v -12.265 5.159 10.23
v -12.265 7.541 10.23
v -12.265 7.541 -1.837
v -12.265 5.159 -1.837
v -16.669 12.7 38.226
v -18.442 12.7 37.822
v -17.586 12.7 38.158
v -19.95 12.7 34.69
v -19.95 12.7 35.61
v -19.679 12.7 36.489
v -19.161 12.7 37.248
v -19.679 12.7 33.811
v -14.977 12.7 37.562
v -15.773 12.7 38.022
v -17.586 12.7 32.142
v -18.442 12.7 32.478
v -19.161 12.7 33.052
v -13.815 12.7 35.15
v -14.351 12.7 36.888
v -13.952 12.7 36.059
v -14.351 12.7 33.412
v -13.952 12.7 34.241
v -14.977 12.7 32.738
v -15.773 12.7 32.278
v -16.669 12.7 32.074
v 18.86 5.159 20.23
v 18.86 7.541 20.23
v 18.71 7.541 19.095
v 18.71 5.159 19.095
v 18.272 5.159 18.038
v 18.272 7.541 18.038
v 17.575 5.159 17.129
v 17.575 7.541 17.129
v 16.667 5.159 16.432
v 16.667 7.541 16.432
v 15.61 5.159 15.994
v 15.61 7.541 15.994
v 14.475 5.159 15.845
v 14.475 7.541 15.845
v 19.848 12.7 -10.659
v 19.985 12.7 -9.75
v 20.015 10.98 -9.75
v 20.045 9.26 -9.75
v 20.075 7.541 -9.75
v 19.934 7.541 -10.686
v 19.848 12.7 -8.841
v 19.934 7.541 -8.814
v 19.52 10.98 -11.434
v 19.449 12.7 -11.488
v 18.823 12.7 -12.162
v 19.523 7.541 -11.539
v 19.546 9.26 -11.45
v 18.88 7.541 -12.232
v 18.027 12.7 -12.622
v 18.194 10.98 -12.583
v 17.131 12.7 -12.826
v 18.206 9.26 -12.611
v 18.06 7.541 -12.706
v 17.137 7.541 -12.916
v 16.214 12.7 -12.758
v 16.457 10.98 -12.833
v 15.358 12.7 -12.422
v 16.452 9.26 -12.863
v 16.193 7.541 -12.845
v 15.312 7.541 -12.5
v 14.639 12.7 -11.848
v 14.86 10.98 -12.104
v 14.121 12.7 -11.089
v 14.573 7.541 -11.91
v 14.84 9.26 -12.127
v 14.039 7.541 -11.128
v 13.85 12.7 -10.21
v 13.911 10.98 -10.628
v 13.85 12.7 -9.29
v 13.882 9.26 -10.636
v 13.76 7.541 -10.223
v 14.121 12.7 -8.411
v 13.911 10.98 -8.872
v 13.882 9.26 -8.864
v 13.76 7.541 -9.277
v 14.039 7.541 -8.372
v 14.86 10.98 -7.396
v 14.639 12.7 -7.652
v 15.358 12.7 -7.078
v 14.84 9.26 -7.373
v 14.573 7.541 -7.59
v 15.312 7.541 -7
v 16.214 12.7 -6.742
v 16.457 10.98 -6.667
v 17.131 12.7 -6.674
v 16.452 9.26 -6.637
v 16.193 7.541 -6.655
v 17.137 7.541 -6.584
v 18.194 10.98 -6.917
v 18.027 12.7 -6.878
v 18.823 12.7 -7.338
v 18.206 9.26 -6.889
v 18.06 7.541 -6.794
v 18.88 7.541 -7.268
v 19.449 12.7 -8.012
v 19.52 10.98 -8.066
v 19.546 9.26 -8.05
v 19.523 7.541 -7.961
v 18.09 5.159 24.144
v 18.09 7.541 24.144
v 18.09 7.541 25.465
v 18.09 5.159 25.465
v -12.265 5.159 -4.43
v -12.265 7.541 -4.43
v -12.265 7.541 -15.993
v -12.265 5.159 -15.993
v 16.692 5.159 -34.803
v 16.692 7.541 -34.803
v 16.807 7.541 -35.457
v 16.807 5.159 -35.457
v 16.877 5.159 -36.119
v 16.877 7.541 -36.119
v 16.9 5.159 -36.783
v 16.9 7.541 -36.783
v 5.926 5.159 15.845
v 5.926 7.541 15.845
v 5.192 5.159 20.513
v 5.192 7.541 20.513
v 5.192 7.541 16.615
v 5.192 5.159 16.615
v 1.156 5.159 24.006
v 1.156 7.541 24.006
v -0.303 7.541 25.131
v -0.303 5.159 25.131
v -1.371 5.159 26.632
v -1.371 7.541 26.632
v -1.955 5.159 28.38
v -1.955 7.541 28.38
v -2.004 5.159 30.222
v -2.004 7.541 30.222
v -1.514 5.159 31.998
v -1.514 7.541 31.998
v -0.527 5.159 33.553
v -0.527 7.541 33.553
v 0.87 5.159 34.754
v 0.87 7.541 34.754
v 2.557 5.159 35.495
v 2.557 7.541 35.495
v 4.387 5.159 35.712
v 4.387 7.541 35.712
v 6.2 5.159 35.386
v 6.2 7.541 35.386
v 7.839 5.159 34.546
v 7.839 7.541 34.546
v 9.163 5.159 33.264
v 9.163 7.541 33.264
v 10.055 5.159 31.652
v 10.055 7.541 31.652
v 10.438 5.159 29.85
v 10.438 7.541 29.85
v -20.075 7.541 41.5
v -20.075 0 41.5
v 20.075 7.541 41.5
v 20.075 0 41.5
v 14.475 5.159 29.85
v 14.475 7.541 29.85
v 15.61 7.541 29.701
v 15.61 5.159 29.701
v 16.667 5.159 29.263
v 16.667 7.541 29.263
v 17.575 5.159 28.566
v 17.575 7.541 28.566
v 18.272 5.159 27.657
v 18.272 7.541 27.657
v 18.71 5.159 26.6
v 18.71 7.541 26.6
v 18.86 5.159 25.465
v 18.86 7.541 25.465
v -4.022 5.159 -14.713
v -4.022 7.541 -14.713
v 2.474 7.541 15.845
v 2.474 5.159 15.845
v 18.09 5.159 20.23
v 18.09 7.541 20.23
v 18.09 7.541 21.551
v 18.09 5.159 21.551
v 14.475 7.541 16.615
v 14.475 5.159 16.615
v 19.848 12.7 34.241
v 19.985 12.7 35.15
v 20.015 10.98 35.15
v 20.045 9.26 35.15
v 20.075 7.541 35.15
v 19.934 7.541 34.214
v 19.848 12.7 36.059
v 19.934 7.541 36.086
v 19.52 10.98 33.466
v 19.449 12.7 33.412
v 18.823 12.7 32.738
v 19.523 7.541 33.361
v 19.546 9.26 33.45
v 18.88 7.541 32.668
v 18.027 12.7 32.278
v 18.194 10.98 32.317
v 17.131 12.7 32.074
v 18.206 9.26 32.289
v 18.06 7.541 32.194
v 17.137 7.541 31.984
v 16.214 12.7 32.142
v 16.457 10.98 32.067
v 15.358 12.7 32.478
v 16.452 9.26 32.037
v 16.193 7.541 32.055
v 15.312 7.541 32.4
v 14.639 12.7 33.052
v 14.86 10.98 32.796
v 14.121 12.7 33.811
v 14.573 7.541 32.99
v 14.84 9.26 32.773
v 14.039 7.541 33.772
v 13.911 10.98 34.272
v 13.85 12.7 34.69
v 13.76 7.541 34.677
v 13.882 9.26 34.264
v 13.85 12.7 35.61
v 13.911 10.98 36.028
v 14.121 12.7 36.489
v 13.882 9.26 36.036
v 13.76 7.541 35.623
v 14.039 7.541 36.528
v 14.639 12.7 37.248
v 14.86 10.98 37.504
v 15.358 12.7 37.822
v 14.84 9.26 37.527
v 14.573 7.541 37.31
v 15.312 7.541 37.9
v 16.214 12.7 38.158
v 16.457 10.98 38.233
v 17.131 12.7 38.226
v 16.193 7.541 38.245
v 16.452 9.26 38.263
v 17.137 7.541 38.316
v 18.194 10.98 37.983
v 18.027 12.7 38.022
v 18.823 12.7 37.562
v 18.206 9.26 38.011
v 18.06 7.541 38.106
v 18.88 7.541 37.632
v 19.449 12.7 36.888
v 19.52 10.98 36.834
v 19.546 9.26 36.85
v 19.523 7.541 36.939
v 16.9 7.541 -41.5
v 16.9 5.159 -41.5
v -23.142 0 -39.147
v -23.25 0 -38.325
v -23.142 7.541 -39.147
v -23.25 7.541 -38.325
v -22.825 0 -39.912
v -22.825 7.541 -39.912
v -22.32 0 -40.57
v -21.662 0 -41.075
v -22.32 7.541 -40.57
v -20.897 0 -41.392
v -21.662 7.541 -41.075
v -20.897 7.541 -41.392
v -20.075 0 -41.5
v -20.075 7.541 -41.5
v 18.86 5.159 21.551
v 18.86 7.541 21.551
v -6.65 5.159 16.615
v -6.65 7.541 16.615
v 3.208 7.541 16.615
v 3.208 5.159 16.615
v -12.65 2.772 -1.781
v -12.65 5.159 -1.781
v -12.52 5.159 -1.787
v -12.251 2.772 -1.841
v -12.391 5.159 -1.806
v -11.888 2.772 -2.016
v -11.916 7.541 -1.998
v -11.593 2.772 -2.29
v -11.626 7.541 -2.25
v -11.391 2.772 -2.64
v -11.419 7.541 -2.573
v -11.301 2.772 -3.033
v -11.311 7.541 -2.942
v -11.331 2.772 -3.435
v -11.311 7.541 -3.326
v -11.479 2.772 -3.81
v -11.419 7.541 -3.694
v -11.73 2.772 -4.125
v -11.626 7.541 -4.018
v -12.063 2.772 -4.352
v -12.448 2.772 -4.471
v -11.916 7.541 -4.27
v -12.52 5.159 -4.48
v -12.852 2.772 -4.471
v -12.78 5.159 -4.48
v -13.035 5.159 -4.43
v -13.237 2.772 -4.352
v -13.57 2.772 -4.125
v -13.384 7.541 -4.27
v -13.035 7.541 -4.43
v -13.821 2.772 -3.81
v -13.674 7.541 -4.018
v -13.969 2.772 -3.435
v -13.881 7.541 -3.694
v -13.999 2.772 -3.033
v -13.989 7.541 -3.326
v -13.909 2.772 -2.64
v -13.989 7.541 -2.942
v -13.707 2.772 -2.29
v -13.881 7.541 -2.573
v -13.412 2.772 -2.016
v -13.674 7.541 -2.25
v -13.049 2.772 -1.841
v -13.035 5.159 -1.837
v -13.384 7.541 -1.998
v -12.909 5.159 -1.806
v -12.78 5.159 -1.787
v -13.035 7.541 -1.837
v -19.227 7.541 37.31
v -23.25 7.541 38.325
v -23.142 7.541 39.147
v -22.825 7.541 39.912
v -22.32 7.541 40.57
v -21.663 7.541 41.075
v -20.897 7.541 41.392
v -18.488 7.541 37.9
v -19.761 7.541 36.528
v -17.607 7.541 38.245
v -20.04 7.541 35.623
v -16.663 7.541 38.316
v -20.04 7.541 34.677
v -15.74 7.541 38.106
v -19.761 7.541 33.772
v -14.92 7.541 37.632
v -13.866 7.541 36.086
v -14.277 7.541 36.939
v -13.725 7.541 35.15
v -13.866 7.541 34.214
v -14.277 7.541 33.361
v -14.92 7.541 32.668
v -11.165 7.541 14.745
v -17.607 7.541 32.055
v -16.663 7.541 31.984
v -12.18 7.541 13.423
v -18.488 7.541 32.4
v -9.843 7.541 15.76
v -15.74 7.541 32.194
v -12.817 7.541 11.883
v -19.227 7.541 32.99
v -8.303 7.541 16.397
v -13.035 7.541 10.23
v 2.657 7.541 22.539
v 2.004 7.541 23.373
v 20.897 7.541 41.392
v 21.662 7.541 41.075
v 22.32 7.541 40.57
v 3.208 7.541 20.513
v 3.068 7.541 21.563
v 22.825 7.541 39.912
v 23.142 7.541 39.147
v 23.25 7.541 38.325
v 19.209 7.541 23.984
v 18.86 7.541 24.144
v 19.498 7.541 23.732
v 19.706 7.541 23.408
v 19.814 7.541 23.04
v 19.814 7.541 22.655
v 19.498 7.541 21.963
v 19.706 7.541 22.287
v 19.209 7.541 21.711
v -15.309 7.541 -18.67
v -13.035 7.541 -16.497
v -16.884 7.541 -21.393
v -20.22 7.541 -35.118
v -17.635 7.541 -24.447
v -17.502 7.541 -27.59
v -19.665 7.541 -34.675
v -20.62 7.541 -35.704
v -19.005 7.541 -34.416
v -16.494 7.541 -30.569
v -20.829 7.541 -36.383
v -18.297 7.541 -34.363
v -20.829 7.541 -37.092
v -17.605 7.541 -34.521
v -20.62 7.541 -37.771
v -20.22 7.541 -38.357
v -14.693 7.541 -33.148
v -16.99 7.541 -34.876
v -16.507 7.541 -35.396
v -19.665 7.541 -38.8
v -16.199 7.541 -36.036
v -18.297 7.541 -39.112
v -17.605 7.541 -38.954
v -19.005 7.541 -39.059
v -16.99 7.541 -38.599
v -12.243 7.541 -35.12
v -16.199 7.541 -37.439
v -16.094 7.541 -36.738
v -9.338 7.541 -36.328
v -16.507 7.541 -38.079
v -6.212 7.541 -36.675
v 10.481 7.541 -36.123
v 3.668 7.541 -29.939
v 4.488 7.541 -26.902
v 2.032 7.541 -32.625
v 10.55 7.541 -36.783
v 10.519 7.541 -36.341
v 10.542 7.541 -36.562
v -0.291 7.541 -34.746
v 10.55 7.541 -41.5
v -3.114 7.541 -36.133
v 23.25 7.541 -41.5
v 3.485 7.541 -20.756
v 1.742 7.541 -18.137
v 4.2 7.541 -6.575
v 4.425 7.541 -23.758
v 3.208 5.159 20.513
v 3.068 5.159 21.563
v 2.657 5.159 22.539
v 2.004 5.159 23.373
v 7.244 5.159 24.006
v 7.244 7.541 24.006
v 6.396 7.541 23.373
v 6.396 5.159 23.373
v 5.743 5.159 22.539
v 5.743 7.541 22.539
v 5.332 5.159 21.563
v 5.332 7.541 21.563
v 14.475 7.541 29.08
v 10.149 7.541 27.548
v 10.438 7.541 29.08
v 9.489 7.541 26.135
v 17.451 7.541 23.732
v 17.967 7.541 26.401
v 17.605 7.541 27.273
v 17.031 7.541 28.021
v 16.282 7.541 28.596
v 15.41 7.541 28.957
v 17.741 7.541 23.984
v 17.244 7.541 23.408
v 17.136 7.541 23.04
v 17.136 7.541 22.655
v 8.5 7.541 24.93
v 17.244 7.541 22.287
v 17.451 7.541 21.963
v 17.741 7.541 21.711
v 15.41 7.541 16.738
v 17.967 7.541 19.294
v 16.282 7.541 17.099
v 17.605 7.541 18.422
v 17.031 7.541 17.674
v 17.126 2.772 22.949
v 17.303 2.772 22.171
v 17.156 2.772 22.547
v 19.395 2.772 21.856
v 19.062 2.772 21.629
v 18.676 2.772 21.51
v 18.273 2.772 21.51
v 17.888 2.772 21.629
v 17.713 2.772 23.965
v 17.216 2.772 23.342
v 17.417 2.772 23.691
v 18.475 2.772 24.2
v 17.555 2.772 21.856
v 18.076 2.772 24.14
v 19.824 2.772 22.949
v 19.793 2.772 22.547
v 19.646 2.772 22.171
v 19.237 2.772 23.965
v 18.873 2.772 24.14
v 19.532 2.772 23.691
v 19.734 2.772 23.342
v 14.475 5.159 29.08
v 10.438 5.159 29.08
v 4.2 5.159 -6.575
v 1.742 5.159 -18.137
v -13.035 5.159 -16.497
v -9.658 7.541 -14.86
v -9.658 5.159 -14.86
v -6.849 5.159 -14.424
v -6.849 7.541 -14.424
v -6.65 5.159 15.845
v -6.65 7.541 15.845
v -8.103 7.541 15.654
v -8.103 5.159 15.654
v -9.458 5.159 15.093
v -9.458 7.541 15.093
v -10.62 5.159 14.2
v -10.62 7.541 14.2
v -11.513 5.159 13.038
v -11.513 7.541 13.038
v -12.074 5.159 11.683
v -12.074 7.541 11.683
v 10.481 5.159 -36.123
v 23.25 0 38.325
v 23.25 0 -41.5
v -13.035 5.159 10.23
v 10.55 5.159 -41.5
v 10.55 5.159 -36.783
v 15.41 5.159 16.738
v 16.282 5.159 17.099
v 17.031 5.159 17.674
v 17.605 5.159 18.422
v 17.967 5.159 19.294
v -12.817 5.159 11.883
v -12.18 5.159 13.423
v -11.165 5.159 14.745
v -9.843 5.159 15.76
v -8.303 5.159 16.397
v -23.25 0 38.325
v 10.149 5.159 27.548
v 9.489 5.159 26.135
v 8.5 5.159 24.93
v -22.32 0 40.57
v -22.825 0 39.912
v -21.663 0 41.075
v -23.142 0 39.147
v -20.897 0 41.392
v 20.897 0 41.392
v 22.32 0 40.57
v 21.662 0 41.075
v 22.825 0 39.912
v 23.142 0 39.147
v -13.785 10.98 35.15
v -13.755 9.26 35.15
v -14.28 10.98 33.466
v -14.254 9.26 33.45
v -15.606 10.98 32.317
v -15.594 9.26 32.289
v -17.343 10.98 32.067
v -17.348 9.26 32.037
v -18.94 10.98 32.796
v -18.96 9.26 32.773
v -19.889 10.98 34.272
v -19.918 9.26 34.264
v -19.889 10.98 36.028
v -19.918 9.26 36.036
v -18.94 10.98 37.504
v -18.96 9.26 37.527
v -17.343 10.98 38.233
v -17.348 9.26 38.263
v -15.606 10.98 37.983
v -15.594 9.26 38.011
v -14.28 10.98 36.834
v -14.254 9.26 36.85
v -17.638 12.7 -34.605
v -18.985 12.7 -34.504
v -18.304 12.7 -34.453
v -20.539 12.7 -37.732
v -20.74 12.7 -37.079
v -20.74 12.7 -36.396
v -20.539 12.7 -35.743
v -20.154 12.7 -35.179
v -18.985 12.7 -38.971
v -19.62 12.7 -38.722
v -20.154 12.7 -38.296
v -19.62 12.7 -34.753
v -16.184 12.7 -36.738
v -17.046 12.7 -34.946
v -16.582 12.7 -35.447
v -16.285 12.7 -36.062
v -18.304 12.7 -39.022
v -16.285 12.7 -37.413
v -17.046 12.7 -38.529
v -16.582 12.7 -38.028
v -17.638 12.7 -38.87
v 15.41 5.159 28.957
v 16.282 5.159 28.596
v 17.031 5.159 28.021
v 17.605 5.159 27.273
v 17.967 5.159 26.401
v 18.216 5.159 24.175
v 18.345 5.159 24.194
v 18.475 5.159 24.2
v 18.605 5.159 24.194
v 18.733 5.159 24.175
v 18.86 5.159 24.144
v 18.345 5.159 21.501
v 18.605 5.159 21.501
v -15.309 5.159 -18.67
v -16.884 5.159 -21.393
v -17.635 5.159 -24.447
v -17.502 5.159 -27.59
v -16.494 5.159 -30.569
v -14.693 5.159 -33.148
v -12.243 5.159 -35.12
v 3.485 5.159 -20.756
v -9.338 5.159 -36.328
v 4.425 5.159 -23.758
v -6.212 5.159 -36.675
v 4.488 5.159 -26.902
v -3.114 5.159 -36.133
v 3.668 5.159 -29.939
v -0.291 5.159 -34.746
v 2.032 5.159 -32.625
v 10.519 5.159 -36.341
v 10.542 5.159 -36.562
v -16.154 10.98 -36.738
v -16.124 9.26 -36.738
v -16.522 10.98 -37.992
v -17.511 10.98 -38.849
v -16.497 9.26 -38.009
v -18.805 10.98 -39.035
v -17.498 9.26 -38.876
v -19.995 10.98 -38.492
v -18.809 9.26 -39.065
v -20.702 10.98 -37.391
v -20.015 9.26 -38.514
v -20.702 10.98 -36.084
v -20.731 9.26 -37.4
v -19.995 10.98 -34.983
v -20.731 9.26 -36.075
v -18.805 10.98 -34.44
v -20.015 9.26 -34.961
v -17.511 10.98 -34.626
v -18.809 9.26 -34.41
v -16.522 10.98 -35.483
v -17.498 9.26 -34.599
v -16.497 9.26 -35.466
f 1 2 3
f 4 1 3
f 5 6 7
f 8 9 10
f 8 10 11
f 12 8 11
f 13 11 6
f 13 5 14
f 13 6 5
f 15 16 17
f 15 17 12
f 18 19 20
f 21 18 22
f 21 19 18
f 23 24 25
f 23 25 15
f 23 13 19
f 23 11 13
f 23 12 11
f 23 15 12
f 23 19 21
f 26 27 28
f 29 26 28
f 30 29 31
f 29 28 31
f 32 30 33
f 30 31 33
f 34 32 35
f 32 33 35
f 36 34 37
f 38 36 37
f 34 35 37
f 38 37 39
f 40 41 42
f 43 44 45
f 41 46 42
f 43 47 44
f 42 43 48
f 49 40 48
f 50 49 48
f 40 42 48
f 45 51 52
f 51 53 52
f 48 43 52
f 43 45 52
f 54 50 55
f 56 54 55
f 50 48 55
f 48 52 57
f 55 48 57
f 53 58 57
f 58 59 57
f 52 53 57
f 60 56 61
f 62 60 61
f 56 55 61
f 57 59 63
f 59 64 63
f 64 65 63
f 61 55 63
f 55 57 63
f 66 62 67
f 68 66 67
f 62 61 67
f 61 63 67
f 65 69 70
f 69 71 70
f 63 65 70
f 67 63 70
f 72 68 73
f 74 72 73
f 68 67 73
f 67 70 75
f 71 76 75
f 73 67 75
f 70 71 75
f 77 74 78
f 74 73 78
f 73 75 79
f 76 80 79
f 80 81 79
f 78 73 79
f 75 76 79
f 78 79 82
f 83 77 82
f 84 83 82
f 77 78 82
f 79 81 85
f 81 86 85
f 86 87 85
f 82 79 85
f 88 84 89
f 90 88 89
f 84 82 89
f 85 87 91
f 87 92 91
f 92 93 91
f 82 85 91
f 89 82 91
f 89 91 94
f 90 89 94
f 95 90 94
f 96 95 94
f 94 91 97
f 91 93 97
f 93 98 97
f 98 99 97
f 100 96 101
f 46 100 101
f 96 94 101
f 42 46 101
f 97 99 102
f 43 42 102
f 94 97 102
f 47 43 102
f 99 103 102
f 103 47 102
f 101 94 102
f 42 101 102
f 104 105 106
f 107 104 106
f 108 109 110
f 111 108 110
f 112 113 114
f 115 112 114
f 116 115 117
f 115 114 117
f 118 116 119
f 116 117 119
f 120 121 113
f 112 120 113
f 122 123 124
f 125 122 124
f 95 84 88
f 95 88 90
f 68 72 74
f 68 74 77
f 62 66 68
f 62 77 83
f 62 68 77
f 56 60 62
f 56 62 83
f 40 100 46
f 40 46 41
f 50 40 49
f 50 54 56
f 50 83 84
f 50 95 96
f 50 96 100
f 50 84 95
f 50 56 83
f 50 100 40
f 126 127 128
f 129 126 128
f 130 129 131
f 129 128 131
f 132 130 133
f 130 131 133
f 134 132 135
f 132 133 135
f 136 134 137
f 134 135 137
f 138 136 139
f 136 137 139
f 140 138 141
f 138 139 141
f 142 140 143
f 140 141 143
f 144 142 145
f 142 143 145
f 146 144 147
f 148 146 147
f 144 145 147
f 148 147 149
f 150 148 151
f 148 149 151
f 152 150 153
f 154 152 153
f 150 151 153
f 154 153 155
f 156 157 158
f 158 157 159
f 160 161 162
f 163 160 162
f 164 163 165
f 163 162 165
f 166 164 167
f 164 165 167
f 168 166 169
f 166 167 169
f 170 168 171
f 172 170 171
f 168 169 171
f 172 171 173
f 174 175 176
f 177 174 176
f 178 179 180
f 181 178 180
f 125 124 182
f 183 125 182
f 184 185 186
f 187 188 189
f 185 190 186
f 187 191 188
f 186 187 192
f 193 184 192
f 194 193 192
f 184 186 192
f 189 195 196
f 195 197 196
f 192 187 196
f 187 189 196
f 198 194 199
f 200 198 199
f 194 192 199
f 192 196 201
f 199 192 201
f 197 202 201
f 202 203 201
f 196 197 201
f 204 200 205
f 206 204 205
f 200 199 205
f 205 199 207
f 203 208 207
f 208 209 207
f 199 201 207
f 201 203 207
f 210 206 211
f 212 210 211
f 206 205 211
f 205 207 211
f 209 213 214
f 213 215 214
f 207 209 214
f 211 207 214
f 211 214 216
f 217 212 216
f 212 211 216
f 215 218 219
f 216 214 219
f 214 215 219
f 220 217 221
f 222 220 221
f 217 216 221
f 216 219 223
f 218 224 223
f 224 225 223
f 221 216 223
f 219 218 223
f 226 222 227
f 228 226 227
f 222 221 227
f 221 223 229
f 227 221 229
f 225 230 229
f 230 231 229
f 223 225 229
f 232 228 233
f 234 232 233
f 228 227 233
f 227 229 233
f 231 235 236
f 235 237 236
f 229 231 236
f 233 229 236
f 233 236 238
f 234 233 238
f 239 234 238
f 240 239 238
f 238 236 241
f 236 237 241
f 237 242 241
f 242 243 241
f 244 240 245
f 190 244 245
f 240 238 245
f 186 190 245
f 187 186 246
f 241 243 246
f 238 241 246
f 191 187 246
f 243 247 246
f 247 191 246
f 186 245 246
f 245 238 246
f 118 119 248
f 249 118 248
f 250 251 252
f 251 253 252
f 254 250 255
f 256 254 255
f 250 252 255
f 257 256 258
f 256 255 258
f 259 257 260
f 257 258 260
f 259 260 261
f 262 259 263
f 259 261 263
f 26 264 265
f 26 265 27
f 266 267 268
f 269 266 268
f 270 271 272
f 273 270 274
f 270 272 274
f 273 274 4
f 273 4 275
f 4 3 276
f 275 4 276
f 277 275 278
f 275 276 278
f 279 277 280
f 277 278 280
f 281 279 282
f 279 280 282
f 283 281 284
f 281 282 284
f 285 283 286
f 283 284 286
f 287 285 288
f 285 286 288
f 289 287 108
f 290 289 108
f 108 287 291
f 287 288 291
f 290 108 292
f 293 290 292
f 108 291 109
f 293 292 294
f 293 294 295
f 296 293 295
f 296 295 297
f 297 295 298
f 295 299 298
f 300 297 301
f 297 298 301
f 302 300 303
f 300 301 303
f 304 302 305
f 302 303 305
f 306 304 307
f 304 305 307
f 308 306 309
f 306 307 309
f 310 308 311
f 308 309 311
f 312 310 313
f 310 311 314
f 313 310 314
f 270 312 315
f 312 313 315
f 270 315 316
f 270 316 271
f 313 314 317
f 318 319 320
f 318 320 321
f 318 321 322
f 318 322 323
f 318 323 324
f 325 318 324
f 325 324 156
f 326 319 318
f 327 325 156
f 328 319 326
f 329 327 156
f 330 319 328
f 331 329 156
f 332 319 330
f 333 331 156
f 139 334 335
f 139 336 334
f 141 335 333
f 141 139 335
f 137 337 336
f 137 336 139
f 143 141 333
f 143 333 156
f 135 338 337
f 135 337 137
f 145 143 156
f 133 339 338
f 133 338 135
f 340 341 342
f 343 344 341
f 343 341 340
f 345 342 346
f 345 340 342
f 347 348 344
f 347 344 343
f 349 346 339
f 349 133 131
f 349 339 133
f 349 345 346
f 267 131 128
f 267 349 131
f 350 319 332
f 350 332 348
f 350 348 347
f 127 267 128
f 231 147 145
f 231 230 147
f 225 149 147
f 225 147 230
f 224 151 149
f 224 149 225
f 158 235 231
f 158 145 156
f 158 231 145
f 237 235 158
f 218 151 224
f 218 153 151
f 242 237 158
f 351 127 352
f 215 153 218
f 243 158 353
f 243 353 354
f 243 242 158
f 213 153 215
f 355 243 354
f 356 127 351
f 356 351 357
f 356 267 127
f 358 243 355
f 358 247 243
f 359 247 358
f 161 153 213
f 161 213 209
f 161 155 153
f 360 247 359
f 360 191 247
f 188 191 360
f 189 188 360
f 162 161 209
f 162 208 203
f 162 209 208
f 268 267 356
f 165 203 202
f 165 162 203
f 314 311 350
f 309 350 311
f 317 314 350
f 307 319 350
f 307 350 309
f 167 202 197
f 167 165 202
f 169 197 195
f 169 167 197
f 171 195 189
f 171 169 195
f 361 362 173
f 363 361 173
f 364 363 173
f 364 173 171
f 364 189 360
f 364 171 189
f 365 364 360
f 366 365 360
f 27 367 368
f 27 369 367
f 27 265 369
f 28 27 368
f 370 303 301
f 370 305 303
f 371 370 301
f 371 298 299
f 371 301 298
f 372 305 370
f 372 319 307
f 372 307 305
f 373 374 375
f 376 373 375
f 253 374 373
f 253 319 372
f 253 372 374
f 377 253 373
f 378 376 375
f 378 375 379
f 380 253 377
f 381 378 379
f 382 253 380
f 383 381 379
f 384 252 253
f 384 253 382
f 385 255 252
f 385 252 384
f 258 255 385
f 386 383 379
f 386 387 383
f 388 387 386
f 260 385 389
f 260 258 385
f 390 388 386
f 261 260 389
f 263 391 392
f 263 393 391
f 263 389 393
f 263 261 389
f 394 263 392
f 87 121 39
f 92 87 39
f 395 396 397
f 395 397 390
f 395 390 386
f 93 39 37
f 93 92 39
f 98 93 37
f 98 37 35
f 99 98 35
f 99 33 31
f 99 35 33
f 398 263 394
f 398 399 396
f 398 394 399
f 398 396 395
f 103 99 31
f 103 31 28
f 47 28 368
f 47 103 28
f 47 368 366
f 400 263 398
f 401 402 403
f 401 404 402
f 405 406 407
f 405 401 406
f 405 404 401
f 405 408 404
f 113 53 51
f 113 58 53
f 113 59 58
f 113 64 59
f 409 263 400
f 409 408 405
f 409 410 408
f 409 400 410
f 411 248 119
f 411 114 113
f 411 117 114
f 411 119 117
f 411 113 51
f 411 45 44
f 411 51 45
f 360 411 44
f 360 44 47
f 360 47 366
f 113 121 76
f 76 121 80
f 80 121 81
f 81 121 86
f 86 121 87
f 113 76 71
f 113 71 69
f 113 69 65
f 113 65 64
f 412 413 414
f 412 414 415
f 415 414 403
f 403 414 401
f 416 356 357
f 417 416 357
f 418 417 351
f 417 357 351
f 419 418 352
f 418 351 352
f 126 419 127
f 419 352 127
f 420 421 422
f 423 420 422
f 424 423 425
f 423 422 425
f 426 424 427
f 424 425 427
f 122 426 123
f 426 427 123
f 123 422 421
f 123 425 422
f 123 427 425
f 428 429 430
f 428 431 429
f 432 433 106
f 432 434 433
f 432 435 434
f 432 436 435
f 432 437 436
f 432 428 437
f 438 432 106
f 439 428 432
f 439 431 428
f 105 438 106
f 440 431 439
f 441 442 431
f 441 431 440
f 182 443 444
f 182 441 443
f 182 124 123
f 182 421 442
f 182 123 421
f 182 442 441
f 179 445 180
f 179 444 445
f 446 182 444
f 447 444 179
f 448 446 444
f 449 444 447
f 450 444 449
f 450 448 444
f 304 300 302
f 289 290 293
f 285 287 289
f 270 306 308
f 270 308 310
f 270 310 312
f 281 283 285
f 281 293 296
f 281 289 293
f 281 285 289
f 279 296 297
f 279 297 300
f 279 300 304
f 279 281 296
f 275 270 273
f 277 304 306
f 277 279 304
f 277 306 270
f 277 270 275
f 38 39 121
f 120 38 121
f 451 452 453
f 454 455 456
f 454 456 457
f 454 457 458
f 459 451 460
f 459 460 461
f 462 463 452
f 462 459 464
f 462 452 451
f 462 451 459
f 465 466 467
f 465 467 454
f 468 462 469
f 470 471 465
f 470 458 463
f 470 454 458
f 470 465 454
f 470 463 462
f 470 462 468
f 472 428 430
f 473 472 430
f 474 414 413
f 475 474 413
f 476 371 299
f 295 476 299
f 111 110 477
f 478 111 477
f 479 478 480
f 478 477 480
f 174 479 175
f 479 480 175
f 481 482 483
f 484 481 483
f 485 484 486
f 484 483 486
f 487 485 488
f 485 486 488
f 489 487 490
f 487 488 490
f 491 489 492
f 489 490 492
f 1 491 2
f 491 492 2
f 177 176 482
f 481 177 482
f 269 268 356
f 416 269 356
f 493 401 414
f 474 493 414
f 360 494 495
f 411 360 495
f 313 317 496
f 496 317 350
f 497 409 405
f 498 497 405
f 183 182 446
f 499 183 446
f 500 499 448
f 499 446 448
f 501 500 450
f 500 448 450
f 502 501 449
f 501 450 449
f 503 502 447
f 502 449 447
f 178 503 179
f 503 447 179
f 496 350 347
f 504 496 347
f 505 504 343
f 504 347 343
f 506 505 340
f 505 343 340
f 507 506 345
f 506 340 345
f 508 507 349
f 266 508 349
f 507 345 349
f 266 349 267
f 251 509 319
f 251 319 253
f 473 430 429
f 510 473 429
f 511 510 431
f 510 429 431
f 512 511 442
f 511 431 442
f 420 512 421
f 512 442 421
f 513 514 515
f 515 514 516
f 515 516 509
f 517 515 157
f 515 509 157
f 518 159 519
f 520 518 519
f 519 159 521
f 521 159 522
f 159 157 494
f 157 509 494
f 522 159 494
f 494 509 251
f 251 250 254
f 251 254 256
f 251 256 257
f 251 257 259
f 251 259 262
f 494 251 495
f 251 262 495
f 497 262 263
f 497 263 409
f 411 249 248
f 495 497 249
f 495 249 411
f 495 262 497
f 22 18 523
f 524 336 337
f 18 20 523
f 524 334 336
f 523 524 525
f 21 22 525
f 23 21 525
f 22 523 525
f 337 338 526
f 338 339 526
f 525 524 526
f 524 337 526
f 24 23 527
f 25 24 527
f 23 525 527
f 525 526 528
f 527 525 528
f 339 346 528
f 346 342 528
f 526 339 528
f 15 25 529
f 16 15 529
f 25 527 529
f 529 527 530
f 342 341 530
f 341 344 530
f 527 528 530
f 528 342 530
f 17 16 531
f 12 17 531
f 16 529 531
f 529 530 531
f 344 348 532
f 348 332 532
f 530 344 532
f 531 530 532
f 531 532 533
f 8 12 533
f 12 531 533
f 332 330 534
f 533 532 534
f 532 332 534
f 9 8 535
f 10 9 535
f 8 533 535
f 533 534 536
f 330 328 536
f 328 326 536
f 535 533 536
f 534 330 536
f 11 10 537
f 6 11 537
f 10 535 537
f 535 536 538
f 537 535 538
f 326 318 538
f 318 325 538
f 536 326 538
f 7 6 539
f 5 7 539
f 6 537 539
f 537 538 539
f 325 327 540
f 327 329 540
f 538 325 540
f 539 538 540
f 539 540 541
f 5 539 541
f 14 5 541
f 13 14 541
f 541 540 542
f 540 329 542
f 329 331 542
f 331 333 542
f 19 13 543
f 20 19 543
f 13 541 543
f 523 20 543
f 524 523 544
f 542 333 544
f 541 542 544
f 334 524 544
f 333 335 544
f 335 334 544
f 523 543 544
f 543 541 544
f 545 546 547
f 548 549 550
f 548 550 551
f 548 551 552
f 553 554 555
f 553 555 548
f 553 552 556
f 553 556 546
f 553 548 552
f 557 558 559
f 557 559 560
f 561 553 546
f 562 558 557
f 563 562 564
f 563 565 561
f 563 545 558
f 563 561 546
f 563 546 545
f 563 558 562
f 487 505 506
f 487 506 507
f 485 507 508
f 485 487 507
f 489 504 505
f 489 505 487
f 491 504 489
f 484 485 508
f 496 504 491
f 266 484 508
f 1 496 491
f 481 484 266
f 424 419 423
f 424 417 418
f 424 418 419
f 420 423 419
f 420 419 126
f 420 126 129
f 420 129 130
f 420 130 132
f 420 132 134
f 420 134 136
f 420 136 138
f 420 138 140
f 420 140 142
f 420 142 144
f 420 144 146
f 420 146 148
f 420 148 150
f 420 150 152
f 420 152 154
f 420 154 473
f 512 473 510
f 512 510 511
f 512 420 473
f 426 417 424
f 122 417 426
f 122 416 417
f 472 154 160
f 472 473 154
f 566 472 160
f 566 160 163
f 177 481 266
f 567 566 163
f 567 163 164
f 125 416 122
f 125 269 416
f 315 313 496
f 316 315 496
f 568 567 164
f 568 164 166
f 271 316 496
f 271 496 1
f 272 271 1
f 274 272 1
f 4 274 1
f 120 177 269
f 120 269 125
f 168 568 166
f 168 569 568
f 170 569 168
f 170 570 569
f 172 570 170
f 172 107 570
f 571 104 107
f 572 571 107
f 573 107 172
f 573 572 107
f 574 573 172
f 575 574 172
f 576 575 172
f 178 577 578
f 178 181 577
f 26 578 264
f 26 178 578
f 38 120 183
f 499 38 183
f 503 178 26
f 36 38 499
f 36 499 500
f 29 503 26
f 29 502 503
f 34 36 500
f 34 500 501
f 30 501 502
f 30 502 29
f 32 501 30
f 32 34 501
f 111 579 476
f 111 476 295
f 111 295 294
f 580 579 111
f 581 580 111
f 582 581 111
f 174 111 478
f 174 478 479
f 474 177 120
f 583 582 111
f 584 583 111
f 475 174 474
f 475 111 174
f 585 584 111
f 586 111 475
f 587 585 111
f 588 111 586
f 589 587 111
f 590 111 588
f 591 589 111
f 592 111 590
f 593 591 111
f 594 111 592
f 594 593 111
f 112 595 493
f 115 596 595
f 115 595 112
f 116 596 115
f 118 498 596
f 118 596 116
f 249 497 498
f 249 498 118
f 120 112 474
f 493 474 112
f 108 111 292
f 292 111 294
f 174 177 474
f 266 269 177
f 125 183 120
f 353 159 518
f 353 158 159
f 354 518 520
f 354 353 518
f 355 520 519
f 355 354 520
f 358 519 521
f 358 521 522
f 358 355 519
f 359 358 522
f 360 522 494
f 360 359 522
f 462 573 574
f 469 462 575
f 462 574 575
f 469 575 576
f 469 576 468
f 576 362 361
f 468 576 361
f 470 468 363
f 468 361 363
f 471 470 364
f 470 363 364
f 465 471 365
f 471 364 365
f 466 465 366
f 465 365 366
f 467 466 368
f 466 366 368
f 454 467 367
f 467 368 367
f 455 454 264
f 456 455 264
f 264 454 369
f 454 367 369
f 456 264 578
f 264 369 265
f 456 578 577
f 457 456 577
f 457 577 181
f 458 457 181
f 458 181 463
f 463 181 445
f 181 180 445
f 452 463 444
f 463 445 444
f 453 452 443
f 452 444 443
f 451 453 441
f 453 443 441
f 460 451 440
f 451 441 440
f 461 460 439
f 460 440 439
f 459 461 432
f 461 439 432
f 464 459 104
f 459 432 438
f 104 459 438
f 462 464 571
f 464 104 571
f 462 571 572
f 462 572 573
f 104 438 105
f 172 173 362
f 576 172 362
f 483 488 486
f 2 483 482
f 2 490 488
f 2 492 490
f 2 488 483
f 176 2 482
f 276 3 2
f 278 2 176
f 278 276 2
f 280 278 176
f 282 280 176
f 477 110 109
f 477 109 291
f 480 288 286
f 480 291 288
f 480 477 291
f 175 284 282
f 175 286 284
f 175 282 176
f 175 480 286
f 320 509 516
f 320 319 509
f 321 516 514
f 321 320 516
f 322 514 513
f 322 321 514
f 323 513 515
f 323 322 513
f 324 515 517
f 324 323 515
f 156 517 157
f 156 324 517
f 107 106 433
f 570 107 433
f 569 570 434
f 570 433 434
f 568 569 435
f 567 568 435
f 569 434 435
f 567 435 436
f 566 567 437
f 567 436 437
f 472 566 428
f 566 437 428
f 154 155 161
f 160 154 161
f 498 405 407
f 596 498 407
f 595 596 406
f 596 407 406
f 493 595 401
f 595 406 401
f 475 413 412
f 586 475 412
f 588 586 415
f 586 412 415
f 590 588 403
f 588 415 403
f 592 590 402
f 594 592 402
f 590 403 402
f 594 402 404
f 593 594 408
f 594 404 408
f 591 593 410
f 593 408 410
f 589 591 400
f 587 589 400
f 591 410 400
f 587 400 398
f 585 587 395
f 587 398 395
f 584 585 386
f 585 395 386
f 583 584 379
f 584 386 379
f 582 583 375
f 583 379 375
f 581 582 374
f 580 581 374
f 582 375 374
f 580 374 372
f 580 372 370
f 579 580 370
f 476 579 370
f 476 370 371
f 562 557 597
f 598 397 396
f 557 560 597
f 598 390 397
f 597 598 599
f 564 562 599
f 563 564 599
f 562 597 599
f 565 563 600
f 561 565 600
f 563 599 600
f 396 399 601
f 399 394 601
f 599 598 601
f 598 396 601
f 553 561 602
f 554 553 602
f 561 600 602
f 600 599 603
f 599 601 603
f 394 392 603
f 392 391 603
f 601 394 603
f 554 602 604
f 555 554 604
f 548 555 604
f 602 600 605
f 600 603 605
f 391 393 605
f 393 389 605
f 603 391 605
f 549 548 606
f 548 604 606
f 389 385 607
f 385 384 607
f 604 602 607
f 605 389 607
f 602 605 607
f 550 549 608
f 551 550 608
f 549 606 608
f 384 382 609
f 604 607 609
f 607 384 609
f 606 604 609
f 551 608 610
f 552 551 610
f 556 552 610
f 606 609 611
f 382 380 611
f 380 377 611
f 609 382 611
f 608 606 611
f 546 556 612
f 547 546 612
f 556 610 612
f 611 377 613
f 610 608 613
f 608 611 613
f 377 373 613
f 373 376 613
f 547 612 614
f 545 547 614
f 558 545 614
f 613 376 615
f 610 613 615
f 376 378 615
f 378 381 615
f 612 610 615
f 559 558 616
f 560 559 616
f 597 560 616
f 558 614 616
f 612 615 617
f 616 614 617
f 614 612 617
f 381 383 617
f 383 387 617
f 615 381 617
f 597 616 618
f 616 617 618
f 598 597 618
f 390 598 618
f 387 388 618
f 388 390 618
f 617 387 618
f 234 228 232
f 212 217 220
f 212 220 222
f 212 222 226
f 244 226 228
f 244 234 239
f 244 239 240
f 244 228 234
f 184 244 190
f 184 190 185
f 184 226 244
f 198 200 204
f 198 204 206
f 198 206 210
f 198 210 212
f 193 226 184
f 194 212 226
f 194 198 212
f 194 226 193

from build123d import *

# Parameters (mm, degrees)
SKETCH1_W                     = 46.5
SKETCH1_H                     = 83
BOSS_EXTRUDE1_DEPTH           = 7.540625
CUT_EXTRUDE3_START            = 7.540625
CUT_EXTRUDE3_DEPTH            = 2.38125
SKETCH10_R                    = 1.35255
CUT_EXTRUDE6_DEPTH            = 4.76885
SKETCH12_R                    = 3.175
BOSS_EXTRUDE2_DEPTH           = 5.159375
BOSS_EXTRUDE2_DRAFT           = 1
BOSS_EXTRUDE2_PROFILE_2_DEPTH = 5.159375
BOSS_EXTRUDE2_PROFILE_2_DRAFT = 1
BOSS_EXTRUDE2_PROFILE_3_DEPTH = 5.159375
BOSS_EXTRUDE2_PROFILE_3_DRAFT = 1
SKETCH12_R_2                  = 2.38125
BOSS_EXTRUDE2_PROFILE_4_DEPTH = 5.159375
BOSS_EXTRUDE2_PROFILE_4_DRAFT = 1
FILLET1_R                     = 3.175


with BuildPart() as part:
    # Sketch1 → Boss-Extrude1 (new body)
    with BuildSketch(Plane(origin=(0, 0, 0), x_dir=(1, 0, 0), z_dir=(0, 1, 0))):
        Rectangle(SKETCH1_W, SKETCH1_H)
    extrude(amount=BOSS_EXTRUDE1_DEPTH)

    # Sketch2 → Cut-Extrude3 (cut)
    with BuildSketch(Plane(origin=(0, 0, 0), x_dir=(1, 0, 0), z_dir=(0, 1, 0)).offset(CUT_EXTRUDE3_START)):
        with BuildLine():
            Line((5.926342072, -15.8450122), (16.691855897, 34.802748287))
            ThreePointArc((16.691855897, 34.802748287), (16.847821053, 35.78747353), (16.9, 36.783107142))
            Line((16.9, 36.783107142), (16.9, 41.5))
            Line((16.9, 41.5), (10.55, 41.5))
            Line((10.55, 41.5), (10.55, 36.783107142))
            ThreePointArc((10.55, 36.783107142), (10.532607018, 36.451229271), (10.480618632, 36.122987524))
            Line((10.480618632, 36.122987524), (4.2, 6.575))
            Line((4.2, 6.575), (1.742353127, 18.137319476))
            ThreePointArc((1.742353127, 18.137319476), (-7.787687338, 36.612083158), (-13.035, 16.49730565))
            Line((-13.035, 16.49730565), (-13.035, -10.23))
            ThreePointArc((-13.035, -10.23), (-11.164876798, -14.744876798), (-6.65, -16.615))
            Line((-6.65, -16.615), (3.2078125, -16.615))
            Line((3.2078125, -16.615), (3.2078125, -20.512873774))
            ThreePointArc((3.2078125, -20.512873774), (2.656919843, -22.538622657), (1.155983232, -24.006386448))
            ThreePointArc((1.155983232, -24.006386448), (0.870208506, -34.75413874), (10.438131483, -29.8499878))
            Line((10.438131483, -29.8499878), (14.4748, -29.8499878))
            ThreePointArc((14.4748, -29.8499878), (17.575454609, -28.565654609), (18.8597878, -25.465))
            Line((18.8597878, -25.465), (18.8597878, -20.23))
            ThreePointArc((18.8597878, -20.23), (17.575454609, -17.129345391), (14.4748, -15.8450122))
            Line((14.4748, -15.8450122), (5.926342072, -15.8450122))
        make_face()
        with BuildLine():
            Line((14.4748, -29.08), (10.43813073, -29.08))
            ThreePointArc((10.43813073, -29.08), (9.489135484, -26.135203334), (7.244016768, -24.006386448))
            ThreePointArc((7.244016768, -24.006386448), (5.743080157, -22.538622657), (5.1921875, -20.512873774))
            Line((5.1921875, -20.512873774), (5.1921875, -16.615))
            Line((5.1921875, -16.615), (14.4748, -16.615))
            ThreePointArc((14.4748, -16.615), (17.030991014, -17.673808986), (18.0898, -20.23))
            Line((18.0898, -20.23), (18.0898, -25.465))
            ThreePointArc((18.0898, -25.465), (17.030991014, -28.021191014), (14.4748, -29.08))
        make_face(mode=Mode.SUBTRACT)
        with BuildLine():
            Line((-4.021712531, 14.713303237), (2.473657928, -15.8450122))
            Line((2.473657928, -15.8450122), (-6.65, -15.8450122))
            ThreePointArc((-6.65, -15.8450122), (-10.620413203, -14.200413203), (-12.2650122, -10.23))
            Line((-12.2650122, -10.23), (-12.2650122, 15.993340762))
            ThreePointArc((-12.2650122, 15.993340762), (-8.267823292, 14.551807439), (-4.021712531, 14.713303237))
        make_face(mode=Mode.SUBTRACT)
    extrude(amount=-CUT_EXTRUDE3_DEPTH, mode=Mode.SUBTRACT)

    # Sketch10 → Cut-Extrude6 (cut)
    with BuildSketch(Plane(origin=(0, 7.540625, 0), x_dir=(1, 0, 0), z_dir=(0, 1, 0))):
        with Locations(Location((18.4747939, -22.8475, 0), (0, 0, 270))):
            Circle(SKETCH10_R)
        with Locations(Location((-12.6500061, 3.133652825, 0), (0, 0, 270))):
            Circle(SKETCH10_R)
    extrude(amount=-CUT_EXTRUDE6_DEPTH, mode=Mode.SUBTRACT)


with BuildPart() as boss_extrude2_tool:
    # Sketch12 → Boss-Extrude2 (with draft: the straight prism first)
    with BuildSketch(Plane(origin=(0, 7.540625, 0), x_dir=(1, 0, 0), z_dir=(0, 1, 0))):
        with Locations((-16.9, -35.15)):
            Circle(SKETCH12_R)
    extrude(amount=BOSS_EXTRUDE2_DEPTH)
    # Boss-Extrude2: the draft: its side faces are tilted about the plane it starts from
    boss_extrude2_sides = [boss_extrude2_tool.faces().sort_by_distance(p)[0] for p in [
        (-20.075, 10.1203125, 35.15),
    ]]
    draft(boss_extrude2_sides, Plane(origin=(0, 7.540625, 0), x_dir=(1, 0, 0), z_dir=(0, 1, 0)), BOSS_EXTRUDE2_DRAFT)


with BuildPart() as part_1:
    add(part.part)

    # Boss-Extrude2: add boss_extrude2_tool
    add(boss_extrude2_tool.part)


with BuildPart() as boss_extrude2_profile_2_tool:
    # Sketch12 → Boss-Extrude2 profile 2 (with draft: the straight prism first)
    with BuildSketch(Plane(origin=(0, 7.540625, 0), x_dir=(1, 0, 0), z_dir=(0, 1, 0))):
        with Locations((16.9, -35.15)):
            Circle(SKETCH12_R)
    extrude(amount=BOSS_EXTRUDE2_PROFILE_2_DEPTH)
    # Boss-Extrude2 profile 2: the draft: its side faces are tilted about the plane it starts from
    boss_extrude2_profile_2_sides = [boss_extrude2_profile_2_tool.faces().sort_by_distance(p)[0] for p in [
        (13.725, 10.1203125, 35.15),
    ]]
    draft(boss_extrude2_profile_2_sides, Plane(origin=(0, 7.540625, 0), x_dir=(1, 0, 0), z_dir=(0, 1, 0)), BOSS_EXTRUDE2_PROFILE_2_DRAFT)


with BuildPart() as part_2:
    add(part_1.part)

    # Boss-Extrude2 profile 2: add boss_extrude2_profile_2_tool
    add(boss_extrude2_profile_2_tool.part)


with BuildPart() as boss_extrude2_profile_3_tool:
    # Sketch12 → Boss-Extrude2 profile 3 (with draft: the straight prism first)
    with BuildSketch(Plane(origin=(0, 7.540625, 0), x_dir=(1, 0, 0), z_dir=(0, 1, 0))):
        with Locations((16.9, 9.75)):
            Circle(SKETCH12_R)
    extrude(amount=BOSS_EXTRUDE2_PROFILE_3_DEPTH)
    # Boss-Extrude2 profile 3: the draft: its side faces are tilted about the plane it starts from
    boss_extrude2_profile_3_sides = [boss_extrude2_profile_3_tool.faces().sort_by_distance(p)[0] for p in [
        (13.725, 10.1203125, -9.75),
    ]]
    draft(boss_extrude2_profile_3_sides, Plane(origin=(0, 7.540625, 0), x_dir=(1, 0, 0), z_dir=(0, 1, 0)), BOSS_EXTRUDE2_PROFILE_3_DRAFT)


with BuildPart() as part_3:
    add(part_2.part)

    # Boss-Extrude2 profile 3: add boss_extrude2_profile_3_tool
    add(boss_extrude2_profile_3_tool.part)


with BuildPart() as boss_extrude2_profile_4_tool:
    # Sketch12 → Boss-Extrude2 profile 4 (with draft: the straight prism first)
    with BuildSketch(Plane(origin=(0, 7.540625, 0), x_dir=(1, 0, 0), z_dir=(0, 1, 0))):
        with Locations((-18.4748, 36.7375)):
            Circle(SKETCH12_R_2)
    extrude(amount=BOSS_EXTRUDE2_PROFILE_4_DEPTH)
    # Boss-Extrude2 profile 4: the draft: its side faces are tilted about the plane it starts from
    boss_extrude2_profile_4_sides = [boss_extrude2_profile_4_tool.faces().sort_by_distance(p)[0] for p in [
        (-20.85605, 10.1203125, -36.7375),
    ]]
    draft(boss_extrude2_profile_4_sides, Plane(origin=(0, 7.540625, 0), x_dir=(1, 0, 0), z_dir=(0, 1, 0)), BOSS_EXTRUDE2_PROFILE_4_DRAFT)


with BuildPart() as part_4:
    add(part_3.part)

    # Boss-Extrude2 profile 4: add boss_extrude2_profile_4_tool
    add(boss_extrude2_profile_4_tool.part)

    # Fillet1
    fillet1_edges = [part_4.edges().sort_by_distance(p)[0] for p in [
        (23.25, 3.7703125, 41.5),
        (-23.25, 3.7703125, 41.5),
        (-23.25, 3.7703125, -41.5),
    ]]
    fillet(fillet1_edges, radius=FILLET1_R)


solid = part_4.part
